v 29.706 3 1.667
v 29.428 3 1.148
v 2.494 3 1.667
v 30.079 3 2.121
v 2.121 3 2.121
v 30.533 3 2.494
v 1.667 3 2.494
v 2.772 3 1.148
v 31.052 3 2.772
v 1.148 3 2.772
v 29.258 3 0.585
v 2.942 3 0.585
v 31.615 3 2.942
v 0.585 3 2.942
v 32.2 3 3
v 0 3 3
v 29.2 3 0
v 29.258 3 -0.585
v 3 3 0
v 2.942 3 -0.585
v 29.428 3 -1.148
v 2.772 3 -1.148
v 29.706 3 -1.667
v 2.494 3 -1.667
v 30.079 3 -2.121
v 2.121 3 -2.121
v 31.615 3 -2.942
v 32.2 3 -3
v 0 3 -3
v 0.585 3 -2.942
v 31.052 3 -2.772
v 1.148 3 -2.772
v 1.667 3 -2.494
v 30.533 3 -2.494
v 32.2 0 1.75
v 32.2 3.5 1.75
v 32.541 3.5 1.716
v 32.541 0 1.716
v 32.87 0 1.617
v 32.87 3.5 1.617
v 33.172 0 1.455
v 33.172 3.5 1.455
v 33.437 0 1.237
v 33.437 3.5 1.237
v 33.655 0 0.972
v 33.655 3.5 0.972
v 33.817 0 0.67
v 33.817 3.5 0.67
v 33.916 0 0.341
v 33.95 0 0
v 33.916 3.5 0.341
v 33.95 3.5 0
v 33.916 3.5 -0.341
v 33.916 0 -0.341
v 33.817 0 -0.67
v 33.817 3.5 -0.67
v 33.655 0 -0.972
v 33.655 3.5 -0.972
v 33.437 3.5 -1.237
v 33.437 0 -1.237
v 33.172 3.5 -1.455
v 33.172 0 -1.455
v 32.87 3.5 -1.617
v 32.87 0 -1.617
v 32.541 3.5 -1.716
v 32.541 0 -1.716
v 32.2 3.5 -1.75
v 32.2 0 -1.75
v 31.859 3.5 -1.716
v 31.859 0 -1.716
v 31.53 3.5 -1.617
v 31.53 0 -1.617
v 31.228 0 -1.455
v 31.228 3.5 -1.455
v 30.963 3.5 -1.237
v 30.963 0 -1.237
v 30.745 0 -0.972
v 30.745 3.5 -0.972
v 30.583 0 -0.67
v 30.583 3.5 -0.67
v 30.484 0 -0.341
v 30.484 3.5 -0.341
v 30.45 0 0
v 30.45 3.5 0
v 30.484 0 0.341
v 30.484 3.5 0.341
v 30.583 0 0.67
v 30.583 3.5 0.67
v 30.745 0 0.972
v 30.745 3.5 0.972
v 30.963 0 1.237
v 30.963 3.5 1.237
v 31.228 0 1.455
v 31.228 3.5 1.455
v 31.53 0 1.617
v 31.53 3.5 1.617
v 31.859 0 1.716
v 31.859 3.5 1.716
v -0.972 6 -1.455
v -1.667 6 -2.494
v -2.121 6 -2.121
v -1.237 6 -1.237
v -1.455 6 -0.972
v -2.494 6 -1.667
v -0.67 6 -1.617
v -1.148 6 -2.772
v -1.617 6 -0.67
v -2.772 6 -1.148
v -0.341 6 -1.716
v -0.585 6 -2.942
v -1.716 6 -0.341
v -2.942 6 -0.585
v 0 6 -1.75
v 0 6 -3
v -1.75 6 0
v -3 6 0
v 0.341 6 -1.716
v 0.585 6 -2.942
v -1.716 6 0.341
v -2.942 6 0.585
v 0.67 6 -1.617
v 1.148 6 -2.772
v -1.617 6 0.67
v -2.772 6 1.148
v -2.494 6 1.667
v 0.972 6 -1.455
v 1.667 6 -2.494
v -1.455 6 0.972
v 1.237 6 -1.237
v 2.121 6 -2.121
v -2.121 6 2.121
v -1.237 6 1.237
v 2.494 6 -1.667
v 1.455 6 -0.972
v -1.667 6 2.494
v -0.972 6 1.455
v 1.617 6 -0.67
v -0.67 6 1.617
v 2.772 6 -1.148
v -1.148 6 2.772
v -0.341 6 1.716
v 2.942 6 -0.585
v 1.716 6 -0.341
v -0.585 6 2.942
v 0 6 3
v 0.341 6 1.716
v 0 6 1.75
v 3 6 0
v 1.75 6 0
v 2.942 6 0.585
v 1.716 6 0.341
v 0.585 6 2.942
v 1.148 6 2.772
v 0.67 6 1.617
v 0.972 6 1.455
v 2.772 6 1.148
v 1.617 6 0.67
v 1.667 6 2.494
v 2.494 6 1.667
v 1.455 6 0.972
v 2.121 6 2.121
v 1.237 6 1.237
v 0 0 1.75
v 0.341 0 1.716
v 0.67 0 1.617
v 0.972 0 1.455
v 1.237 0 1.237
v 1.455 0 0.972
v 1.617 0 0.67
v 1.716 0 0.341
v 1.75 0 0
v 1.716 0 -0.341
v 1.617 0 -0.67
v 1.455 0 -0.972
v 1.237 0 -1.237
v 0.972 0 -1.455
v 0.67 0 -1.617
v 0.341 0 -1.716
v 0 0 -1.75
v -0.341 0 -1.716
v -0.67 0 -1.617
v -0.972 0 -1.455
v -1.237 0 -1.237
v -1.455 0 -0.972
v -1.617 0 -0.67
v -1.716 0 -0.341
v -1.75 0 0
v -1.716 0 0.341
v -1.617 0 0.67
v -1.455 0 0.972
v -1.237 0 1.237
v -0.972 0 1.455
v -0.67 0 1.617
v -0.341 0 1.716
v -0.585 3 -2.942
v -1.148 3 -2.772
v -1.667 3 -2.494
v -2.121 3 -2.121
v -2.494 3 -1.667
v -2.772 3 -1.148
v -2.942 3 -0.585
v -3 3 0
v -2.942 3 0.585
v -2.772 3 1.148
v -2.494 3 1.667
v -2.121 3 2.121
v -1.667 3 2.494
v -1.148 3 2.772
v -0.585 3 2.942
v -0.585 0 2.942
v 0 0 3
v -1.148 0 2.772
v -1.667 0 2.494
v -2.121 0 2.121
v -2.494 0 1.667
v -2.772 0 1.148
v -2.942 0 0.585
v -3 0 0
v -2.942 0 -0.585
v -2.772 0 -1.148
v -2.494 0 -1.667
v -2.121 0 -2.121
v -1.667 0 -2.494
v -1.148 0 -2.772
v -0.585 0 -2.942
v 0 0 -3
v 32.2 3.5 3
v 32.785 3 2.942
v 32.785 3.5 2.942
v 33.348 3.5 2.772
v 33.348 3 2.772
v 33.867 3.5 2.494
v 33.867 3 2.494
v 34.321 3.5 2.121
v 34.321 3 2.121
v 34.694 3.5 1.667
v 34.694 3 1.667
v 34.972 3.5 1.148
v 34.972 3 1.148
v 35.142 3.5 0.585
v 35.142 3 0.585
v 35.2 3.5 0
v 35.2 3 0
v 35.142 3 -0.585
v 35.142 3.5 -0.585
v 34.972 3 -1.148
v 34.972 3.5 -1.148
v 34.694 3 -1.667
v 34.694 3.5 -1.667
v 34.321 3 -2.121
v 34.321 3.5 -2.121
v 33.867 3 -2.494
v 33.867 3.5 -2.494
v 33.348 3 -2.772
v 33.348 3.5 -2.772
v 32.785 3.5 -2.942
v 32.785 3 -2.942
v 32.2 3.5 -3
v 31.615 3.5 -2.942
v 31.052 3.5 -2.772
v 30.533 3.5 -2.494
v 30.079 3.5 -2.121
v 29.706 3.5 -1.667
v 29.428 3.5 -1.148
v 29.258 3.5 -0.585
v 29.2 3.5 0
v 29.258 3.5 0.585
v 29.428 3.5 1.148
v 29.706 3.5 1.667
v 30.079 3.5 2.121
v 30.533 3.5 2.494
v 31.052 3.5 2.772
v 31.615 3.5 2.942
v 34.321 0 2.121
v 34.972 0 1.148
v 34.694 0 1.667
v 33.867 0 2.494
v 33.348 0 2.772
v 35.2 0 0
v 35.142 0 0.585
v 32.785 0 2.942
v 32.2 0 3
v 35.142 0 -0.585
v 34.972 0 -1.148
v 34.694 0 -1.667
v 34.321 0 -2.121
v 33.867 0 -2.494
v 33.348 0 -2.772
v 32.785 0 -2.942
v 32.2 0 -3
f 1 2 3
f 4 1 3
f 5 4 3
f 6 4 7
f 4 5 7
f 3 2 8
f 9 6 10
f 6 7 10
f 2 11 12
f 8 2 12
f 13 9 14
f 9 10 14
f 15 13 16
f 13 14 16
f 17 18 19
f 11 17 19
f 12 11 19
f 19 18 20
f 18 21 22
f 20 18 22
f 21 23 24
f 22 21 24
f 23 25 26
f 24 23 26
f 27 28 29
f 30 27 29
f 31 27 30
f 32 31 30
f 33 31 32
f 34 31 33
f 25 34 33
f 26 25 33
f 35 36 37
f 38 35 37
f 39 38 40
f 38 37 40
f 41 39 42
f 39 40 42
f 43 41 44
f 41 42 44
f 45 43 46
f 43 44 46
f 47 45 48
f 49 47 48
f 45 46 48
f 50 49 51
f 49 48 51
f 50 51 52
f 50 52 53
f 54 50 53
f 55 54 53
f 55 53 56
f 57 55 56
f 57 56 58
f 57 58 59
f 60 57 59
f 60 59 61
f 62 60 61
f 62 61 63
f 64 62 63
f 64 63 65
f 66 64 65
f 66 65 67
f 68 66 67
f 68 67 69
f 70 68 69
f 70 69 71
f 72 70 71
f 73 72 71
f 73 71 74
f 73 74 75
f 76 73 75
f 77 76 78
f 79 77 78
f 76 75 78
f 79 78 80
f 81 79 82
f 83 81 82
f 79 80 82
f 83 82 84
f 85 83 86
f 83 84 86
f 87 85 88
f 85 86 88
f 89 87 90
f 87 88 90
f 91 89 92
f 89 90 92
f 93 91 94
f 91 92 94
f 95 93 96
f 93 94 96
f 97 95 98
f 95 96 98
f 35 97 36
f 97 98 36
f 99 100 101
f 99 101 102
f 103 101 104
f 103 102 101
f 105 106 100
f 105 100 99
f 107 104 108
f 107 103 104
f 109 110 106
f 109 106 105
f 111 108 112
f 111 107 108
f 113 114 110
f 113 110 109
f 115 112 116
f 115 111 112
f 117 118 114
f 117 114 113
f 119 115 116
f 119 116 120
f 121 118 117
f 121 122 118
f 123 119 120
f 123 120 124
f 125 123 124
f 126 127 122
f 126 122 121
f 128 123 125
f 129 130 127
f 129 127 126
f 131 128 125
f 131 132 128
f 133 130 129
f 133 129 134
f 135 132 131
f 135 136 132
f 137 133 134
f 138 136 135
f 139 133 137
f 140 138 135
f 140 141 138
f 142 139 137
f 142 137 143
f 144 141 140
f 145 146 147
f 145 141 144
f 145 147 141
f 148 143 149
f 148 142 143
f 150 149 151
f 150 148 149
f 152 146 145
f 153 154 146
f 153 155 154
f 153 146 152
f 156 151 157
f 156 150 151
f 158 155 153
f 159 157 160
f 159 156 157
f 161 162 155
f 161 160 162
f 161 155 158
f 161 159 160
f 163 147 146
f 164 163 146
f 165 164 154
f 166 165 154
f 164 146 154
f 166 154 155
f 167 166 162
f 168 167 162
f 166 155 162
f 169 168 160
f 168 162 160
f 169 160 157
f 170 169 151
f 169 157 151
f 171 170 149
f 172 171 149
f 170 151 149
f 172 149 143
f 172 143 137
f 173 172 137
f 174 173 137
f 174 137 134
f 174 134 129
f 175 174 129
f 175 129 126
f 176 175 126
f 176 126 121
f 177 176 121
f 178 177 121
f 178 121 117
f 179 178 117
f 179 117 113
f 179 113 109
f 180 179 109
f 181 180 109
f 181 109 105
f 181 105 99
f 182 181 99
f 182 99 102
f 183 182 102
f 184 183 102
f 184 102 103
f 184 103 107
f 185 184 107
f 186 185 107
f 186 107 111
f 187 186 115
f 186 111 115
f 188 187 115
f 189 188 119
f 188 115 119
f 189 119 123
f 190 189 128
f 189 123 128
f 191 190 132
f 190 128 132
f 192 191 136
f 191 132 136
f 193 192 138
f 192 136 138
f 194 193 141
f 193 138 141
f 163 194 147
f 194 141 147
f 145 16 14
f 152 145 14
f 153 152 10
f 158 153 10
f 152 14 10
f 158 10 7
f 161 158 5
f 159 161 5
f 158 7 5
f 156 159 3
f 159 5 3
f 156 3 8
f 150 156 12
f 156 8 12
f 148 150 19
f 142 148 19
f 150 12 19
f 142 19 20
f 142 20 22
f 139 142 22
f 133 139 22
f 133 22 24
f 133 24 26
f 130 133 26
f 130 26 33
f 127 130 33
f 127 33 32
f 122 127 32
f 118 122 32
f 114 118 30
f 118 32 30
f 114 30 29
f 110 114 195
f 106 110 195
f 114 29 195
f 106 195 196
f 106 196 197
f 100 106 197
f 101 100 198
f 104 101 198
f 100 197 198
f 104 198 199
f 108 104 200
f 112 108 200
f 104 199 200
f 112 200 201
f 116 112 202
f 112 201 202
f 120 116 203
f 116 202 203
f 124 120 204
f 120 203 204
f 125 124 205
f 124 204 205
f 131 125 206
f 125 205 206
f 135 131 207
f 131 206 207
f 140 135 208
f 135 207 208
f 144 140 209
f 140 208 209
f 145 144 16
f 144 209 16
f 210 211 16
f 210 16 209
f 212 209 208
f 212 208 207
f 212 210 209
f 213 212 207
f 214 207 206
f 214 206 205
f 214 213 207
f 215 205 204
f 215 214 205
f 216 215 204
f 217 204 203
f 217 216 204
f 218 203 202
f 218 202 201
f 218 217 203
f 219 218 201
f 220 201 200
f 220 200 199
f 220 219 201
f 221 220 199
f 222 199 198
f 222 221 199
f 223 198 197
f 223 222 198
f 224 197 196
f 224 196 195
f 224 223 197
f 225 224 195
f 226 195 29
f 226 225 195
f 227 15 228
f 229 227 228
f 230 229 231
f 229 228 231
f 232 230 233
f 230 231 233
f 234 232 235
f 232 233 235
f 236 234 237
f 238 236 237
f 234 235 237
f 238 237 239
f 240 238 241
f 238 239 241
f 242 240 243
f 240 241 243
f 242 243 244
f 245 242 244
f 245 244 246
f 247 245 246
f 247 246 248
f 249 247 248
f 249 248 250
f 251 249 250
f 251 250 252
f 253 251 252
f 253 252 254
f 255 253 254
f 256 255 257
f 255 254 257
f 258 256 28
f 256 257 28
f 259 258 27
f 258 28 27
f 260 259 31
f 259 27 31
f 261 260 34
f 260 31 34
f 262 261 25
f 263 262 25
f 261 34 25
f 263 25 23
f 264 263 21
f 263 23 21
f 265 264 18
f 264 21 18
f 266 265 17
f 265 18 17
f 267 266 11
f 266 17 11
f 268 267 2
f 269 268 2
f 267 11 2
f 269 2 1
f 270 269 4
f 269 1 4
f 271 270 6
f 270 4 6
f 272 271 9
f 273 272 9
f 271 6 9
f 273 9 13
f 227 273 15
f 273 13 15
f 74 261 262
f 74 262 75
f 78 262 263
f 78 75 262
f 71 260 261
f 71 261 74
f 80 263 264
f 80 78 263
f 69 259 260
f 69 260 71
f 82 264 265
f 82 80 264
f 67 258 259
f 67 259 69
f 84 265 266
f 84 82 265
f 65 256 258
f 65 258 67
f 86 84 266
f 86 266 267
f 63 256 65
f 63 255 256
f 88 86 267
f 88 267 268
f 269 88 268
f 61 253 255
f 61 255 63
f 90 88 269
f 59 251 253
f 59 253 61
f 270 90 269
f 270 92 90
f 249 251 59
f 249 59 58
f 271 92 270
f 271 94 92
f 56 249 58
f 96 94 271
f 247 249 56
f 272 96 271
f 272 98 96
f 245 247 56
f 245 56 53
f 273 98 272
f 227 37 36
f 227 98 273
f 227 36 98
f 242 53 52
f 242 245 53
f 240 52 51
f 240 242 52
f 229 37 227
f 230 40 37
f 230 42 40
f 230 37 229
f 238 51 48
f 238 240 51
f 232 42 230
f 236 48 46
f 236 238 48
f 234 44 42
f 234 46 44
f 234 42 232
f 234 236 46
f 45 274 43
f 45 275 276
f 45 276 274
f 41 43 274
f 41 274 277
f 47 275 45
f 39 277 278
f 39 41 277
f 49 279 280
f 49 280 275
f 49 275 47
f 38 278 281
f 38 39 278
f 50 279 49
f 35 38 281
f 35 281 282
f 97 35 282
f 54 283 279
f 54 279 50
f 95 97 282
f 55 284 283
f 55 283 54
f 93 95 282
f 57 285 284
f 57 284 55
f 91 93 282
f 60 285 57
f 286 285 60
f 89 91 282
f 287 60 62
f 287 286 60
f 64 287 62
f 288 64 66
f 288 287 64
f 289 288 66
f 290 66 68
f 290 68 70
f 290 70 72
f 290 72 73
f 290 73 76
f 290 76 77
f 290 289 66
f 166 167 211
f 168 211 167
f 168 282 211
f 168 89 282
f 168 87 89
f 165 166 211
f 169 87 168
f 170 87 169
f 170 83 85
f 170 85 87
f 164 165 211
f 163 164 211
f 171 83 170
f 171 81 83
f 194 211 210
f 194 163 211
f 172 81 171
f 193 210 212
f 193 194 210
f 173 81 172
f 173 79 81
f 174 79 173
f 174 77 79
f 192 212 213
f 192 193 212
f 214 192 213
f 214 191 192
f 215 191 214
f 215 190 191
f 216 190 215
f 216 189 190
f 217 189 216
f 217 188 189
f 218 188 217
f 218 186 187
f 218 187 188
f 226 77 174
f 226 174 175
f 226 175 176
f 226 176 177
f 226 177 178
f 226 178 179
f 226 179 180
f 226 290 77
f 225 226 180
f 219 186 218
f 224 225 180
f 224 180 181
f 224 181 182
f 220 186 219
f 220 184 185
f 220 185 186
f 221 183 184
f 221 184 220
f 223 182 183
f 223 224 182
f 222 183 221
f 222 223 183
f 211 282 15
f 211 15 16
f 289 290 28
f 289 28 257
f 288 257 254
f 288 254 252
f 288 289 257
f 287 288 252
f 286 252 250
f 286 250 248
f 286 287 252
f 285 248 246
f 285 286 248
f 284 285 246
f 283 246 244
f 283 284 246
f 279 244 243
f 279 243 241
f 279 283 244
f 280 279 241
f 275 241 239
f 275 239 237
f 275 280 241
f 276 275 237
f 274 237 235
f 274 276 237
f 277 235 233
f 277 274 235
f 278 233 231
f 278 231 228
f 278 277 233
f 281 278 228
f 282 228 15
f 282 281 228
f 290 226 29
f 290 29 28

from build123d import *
from build123d.topology import SkipClean

# Parameters (mm, degrees)
EXTRUDE_1_DEPTH     = 3
SKETCH_2_R          = 3
EXTRUDE_2_DEPTH     = 0.5
SKETCH_3_R          = 3
EXTRUDE_3_DEPTH     = 3
SKETCH_4_R          = 1.75
CUT_EXTRUDE_1_DEPTH = 36.833503876


with BuildPart() as part:
    # Эскиз1 → Бобышка-Вытянуть1 (new body)
    with BuildSketch(Plane(origin=(0, 0, 0), x_dir=(1, 0, 0), z_dir=(0, 1, 0))):
        with BuildLine():
            Line((0, 3), (32.2, 3))
            ThreePointArc((32.2, 3), (35.2, 0), (32.2, -3))
            Line((32.2, -3), (0, -3))
            ThreePointArc((0, -3), (-3, 0), (0, 3))
        make_face()
    extrude(amount=EXTRUDE_1_DEPTH)

    # Эскиз2 → Бобышка-Вытянуть2 (add)
    with SkipClean():  # the faces are left unmerged after this step: merging them gives an invalid solid
        with BuildSketch(Plane(origin=(0, 3, 0), x_dir=(1, 0, 0), z_dir=(0, 1, 0))):
            with Locations((32.2, 0)):
                Circle(SKETCH_2_R)
        extrude(amount=EXTRUDE_2_DEPTH)
    add(part.part.scale(1), mode=Mode.REPLACE)  # the faces are merged on a copy

    # Эскиз3 → Бобышка-Вытянуть3 (add)
    with BuildSketch(Plane(origin=(0, 3, 0), x_dir=(1, 0, 0), z_dir=(0, 1, 0))):
        Circle(SKETCH_3_R)
    extrude(amount=EXTRUDE_3_DEPTH)

    # Эскиз4 → Вырез-Вытянуть1 (cut, through all)
    with BuildSketch(Plane(origin=(0, 6, 0), x_dir=(1, 0, 0), z_dir=(0, 1, 0))):
        Circle(SKETCH_4_R)
        with Locations((32.2, 0)):
            Circle(SKETCH_4_R)
    extrude(amount=-CUT_EXTRUDE_1_DEPTH, mode=Mode.SUBTRACT)


solid = part.part
